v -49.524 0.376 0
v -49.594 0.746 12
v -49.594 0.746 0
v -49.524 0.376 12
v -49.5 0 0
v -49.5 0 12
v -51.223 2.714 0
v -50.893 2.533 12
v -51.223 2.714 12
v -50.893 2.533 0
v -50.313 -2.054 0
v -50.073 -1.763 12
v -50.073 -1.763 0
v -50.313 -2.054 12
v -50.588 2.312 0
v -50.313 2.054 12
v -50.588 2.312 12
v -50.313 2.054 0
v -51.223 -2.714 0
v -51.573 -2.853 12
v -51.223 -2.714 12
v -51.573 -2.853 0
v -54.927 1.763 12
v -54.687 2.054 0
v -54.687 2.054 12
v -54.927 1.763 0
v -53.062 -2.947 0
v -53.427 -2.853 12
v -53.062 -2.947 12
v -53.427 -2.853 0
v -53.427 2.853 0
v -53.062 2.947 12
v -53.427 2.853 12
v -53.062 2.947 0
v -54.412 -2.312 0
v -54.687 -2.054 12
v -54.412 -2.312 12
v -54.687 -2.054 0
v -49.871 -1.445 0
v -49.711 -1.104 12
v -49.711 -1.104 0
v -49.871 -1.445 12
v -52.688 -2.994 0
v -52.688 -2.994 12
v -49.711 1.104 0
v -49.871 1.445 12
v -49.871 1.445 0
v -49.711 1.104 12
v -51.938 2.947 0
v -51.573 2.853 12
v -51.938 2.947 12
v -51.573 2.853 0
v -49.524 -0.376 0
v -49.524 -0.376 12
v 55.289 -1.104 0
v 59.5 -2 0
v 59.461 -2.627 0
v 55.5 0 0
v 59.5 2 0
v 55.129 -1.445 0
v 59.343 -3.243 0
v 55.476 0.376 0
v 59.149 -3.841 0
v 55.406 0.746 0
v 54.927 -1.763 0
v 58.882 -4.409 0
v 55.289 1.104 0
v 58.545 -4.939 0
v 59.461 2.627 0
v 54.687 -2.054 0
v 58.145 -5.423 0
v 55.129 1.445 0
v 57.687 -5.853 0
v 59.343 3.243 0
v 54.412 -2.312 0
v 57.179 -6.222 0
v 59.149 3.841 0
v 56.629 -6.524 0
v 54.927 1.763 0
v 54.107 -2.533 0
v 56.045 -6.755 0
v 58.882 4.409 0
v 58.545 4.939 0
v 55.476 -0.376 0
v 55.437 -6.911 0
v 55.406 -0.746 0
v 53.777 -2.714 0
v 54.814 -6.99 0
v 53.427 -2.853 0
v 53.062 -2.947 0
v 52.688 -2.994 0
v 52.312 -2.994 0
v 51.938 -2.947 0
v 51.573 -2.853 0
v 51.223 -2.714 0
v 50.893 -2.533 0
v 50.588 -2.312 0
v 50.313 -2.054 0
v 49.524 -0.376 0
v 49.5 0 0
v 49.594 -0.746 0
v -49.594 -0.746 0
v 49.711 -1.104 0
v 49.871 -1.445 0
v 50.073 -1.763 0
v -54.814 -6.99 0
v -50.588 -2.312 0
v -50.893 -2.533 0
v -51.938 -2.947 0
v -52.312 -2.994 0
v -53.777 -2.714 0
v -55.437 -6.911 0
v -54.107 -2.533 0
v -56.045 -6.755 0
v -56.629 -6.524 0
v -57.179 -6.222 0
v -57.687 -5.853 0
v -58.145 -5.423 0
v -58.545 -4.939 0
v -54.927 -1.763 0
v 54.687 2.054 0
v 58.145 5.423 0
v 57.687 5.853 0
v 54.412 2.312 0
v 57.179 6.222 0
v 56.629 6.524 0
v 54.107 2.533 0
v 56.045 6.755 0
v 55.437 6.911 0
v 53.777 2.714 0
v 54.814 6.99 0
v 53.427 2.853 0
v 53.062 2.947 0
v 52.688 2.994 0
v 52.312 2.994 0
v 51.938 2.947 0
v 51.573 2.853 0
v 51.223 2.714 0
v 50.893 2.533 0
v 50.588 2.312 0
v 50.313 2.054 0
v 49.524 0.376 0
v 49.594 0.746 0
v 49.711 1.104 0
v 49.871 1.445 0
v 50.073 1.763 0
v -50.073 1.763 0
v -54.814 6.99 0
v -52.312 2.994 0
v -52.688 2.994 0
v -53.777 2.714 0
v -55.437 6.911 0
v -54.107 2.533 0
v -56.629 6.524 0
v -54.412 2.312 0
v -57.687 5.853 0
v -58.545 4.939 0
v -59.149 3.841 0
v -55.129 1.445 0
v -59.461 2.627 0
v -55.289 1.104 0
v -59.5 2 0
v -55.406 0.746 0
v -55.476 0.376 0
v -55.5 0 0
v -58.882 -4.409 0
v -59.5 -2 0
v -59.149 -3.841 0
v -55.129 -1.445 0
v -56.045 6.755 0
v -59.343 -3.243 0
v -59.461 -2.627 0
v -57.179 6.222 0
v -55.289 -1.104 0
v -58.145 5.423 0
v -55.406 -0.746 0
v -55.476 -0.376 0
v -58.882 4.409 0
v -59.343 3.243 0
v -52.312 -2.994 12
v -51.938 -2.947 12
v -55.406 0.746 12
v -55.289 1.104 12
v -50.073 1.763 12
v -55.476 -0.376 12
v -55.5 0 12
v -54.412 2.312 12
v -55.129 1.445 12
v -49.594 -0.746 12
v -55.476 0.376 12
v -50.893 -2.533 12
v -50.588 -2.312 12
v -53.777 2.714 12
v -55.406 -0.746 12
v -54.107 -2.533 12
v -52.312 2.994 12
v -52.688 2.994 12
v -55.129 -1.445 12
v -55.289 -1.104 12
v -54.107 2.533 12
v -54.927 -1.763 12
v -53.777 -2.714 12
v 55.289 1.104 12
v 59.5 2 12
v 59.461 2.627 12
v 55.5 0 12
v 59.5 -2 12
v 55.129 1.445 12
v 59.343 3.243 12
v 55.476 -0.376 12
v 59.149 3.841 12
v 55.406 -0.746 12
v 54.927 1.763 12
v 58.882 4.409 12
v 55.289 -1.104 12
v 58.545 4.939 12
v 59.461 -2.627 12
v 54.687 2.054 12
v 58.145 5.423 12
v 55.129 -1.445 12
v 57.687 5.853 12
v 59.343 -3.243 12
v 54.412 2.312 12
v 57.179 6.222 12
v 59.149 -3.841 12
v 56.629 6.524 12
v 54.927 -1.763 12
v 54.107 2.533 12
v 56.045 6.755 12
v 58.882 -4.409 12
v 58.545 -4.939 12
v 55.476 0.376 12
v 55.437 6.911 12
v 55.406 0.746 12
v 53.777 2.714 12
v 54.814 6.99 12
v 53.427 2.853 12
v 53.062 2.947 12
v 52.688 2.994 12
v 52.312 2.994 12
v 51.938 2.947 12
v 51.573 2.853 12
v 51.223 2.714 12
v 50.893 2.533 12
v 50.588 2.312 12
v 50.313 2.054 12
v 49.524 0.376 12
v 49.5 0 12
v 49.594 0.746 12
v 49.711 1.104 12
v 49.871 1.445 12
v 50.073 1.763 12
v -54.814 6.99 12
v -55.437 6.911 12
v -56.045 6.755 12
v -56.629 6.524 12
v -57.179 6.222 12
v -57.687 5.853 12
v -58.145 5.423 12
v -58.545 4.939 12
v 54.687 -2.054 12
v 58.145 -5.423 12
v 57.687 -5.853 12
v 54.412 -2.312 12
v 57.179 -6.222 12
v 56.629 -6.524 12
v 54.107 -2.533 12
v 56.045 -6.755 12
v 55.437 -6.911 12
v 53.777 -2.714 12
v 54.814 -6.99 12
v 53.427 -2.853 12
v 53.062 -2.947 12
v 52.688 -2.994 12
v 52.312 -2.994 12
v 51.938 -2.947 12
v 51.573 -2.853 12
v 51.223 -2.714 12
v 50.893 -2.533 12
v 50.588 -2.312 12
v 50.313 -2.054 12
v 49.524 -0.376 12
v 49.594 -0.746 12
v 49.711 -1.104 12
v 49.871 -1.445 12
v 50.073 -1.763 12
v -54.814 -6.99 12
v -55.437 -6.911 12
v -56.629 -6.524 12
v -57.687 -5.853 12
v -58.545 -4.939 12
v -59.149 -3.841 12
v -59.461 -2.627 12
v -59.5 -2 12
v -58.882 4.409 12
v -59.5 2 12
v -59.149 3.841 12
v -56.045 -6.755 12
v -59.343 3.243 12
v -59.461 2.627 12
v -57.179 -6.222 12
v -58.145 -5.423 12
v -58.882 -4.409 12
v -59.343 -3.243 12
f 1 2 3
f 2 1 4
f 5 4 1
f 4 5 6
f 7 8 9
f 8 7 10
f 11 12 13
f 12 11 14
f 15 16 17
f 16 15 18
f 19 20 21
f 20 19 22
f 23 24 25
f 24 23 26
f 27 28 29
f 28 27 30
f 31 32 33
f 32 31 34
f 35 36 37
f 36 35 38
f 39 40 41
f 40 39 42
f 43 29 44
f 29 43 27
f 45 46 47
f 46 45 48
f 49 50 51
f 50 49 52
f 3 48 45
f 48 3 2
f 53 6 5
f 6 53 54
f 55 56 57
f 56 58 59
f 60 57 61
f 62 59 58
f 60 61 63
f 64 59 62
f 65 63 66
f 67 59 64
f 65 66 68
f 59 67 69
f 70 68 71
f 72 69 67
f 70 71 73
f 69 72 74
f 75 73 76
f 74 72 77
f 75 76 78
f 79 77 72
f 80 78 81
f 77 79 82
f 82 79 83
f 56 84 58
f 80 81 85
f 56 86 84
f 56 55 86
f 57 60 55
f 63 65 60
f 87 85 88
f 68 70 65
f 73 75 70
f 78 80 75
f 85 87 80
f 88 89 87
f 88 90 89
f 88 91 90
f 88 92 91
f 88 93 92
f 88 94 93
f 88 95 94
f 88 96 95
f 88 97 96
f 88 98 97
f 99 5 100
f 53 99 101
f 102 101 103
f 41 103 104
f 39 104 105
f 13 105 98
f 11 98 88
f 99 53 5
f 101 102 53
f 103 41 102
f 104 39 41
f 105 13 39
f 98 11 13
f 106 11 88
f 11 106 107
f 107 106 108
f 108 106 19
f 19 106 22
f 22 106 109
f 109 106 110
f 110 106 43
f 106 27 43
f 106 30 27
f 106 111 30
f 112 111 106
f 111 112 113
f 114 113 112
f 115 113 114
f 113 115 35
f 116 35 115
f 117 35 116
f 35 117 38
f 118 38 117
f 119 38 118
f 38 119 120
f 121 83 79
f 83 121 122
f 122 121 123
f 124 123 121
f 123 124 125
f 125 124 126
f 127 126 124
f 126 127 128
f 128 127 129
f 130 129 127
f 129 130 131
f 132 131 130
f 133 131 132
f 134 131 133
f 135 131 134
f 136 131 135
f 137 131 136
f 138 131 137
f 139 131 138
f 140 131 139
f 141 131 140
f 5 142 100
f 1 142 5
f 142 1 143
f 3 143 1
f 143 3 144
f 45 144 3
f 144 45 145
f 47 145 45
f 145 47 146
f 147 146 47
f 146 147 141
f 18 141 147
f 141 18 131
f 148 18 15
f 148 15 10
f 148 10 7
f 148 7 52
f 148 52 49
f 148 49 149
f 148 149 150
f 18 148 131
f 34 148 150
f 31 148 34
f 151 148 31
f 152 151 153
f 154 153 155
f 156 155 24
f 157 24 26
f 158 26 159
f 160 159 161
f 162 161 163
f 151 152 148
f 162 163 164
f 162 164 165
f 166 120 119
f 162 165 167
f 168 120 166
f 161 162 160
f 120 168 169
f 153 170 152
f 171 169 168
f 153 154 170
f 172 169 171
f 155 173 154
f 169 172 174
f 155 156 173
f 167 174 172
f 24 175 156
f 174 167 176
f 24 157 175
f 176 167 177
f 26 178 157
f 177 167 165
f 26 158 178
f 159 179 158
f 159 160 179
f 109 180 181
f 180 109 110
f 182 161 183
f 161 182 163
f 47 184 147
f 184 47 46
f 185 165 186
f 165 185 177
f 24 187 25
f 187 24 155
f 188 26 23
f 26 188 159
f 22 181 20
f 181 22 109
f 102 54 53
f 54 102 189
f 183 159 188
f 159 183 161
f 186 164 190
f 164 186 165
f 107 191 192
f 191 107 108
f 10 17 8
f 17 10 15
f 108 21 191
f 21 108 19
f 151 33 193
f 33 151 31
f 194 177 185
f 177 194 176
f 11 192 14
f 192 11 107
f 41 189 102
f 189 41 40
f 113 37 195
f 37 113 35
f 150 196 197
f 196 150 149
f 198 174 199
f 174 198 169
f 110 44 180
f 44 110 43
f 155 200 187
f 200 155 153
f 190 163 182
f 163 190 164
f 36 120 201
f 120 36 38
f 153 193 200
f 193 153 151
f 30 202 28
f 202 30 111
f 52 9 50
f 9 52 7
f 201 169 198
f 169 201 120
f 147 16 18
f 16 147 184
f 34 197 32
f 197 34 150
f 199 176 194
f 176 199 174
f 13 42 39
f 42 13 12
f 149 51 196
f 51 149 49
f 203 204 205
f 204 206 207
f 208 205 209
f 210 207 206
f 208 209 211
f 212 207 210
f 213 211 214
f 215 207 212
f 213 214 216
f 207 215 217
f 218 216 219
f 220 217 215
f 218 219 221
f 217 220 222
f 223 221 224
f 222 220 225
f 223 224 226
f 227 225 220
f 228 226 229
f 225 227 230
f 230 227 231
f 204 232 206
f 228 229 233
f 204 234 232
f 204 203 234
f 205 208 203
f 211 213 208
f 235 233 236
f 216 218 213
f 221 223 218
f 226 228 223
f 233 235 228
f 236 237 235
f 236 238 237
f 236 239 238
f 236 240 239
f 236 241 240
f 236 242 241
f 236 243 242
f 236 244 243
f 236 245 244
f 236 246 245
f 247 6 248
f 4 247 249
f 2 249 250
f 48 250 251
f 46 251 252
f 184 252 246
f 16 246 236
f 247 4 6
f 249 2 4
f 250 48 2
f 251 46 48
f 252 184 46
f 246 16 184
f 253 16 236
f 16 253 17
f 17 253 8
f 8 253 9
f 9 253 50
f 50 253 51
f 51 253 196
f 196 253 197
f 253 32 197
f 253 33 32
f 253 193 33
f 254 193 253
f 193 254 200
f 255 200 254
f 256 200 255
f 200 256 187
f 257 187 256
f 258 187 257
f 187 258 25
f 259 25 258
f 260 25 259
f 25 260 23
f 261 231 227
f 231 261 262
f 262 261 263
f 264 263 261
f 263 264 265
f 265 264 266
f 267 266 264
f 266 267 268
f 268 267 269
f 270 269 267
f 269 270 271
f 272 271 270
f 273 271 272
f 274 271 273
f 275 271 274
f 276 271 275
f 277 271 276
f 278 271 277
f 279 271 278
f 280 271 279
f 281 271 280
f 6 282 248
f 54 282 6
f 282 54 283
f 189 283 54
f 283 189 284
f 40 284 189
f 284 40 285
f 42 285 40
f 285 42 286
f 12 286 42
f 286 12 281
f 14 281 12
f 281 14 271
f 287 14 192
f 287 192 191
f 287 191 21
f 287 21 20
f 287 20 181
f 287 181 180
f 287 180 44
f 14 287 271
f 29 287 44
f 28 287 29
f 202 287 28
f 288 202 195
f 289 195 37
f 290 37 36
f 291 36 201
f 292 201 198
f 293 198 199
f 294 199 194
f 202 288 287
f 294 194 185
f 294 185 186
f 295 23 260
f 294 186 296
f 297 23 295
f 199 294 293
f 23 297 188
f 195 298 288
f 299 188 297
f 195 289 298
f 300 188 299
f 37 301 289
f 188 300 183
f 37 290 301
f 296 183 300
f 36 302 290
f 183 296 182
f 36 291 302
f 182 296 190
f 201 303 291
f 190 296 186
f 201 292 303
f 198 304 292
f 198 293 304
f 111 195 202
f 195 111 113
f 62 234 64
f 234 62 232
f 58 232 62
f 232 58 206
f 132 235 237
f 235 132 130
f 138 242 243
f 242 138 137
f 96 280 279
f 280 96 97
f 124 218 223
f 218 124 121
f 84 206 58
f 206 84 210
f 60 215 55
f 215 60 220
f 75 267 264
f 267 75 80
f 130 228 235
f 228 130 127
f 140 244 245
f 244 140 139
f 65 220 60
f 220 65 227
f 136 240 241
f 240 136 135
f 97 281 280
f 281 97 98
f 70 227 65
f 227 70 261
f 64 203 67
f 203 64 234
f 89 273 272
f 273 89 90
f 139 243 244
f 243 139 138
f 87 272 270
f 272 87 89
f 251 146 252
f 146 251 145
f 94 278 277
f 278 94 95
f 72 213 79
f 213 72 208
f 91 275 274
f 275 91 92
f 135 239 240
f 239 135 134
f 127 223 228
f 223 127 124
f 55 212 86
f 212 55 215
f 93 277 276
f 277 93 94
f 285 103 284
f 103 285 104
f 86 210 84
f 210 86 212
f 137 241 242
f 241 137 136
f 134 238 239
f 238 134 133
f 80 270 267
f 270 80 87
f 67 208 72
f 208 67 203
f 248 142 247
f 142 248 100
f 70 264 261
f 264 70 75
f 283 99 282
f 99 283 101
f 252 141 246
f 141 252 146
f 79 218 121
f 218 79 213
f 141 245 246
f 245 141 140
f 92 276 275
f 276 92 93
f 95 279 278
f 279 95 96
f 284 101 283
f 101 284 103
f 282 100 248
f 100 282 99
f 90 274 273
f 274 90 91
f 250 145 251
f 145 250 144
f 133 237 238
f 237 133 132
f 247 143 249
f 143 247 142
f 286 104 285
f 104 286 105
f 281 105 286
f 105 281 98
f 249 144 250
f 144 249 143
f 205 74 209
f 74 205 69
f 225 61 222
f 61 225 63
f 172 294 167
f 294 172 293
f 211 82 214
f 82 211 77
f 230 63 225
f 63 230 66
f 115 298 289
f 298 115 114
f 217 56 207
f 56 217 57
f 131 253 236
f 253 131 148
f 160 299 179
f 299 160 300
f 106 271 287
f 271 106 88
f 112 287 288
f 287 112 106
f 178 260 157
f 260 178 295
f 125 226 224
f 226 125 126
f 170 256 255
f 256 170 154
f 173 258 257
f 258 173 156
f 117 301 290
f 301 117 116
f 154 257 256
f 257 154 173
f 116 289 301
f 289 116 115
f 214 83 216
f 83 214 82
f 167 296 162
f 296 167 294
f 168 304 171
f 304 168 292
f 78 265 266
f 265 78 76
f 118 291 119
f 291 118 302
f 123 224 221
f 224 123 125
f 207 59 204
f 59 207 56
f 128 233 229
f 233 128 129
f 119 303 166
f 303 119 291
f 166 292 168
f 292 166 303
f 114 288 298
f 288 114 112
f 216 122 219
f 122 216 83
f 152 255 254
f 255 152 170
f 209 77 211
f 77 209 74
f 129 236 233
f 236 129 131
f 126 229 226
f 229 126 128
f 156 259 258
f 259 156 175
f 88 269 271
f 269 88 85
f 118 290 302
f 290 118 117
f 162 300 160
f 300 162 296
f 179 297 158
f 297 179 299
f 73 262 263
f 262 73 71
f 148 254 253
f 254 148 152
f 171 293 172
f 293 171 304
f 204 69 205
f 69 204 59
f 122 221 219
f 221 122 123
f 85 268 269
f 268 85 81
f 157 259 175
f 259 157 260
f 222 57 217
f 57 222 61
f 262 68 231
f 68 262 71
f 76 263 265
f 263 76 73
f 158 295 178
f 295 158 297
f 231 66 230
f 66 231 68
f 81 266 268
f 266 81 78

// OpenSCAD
$fn = 50;


difference() {
	union() {
		hull() {
			translate(v = [-54.5000000000, 2.0000000000, 0]) {
				cylinder(h = 12, r = 5);
			}
			translate(v = [54.5000000000, 2.0000000000, 0]) {
				cylinder(h = 12, r = 5);
			}
			translate(v = [-54.5000000000, -2.0000000000, 0]) {
				cylinder(h = 12, r = 5);
			}
			translate(v = [54.5000000000, -2.0000000000, 0]) {
				cylinder(h = 12, r = 5);
			}
		}
	}
	union() {
		translate(v = [-52.5000000000, 0.0000000000, 0]) {
			cylinder(h = 12, r = 3.0000000000);
		}
		translate(v = [52.5000000000, 0.0000000000, 0]) {
			cylinder(h = 12, r = 3.0000000000);
		}
		translate(v = [-52.5000000000, 0.0000000000, 0]) {
			cylinder(h = 12, r = 1.5000000000);
		}
		translate(v = [52.5000000000, 0.0000000000, 0]) {
			cylinder(h = 12, r = 1.5000000000);
		}
		translate(v = [-52.5000000000, 0.0000000000, 0]) {
			cylinder(h = 12, r = 1.5000000000);
		}
		translate(v = [52.5000000000, 0.0000000000, 0]) {
			cylinder(h = 12, r = 1.5000000000);
		}
		translate(v = [-52.5000000000, 0.0000000000, 0]) {
			cylinder(h = 12, r = 1.5000000000);
		}
		translate(v = [52.5000000000, 0.0000000000, 0]) {
			cylinder(h = 12, r = 1.5000000000);
		}
	}
}
